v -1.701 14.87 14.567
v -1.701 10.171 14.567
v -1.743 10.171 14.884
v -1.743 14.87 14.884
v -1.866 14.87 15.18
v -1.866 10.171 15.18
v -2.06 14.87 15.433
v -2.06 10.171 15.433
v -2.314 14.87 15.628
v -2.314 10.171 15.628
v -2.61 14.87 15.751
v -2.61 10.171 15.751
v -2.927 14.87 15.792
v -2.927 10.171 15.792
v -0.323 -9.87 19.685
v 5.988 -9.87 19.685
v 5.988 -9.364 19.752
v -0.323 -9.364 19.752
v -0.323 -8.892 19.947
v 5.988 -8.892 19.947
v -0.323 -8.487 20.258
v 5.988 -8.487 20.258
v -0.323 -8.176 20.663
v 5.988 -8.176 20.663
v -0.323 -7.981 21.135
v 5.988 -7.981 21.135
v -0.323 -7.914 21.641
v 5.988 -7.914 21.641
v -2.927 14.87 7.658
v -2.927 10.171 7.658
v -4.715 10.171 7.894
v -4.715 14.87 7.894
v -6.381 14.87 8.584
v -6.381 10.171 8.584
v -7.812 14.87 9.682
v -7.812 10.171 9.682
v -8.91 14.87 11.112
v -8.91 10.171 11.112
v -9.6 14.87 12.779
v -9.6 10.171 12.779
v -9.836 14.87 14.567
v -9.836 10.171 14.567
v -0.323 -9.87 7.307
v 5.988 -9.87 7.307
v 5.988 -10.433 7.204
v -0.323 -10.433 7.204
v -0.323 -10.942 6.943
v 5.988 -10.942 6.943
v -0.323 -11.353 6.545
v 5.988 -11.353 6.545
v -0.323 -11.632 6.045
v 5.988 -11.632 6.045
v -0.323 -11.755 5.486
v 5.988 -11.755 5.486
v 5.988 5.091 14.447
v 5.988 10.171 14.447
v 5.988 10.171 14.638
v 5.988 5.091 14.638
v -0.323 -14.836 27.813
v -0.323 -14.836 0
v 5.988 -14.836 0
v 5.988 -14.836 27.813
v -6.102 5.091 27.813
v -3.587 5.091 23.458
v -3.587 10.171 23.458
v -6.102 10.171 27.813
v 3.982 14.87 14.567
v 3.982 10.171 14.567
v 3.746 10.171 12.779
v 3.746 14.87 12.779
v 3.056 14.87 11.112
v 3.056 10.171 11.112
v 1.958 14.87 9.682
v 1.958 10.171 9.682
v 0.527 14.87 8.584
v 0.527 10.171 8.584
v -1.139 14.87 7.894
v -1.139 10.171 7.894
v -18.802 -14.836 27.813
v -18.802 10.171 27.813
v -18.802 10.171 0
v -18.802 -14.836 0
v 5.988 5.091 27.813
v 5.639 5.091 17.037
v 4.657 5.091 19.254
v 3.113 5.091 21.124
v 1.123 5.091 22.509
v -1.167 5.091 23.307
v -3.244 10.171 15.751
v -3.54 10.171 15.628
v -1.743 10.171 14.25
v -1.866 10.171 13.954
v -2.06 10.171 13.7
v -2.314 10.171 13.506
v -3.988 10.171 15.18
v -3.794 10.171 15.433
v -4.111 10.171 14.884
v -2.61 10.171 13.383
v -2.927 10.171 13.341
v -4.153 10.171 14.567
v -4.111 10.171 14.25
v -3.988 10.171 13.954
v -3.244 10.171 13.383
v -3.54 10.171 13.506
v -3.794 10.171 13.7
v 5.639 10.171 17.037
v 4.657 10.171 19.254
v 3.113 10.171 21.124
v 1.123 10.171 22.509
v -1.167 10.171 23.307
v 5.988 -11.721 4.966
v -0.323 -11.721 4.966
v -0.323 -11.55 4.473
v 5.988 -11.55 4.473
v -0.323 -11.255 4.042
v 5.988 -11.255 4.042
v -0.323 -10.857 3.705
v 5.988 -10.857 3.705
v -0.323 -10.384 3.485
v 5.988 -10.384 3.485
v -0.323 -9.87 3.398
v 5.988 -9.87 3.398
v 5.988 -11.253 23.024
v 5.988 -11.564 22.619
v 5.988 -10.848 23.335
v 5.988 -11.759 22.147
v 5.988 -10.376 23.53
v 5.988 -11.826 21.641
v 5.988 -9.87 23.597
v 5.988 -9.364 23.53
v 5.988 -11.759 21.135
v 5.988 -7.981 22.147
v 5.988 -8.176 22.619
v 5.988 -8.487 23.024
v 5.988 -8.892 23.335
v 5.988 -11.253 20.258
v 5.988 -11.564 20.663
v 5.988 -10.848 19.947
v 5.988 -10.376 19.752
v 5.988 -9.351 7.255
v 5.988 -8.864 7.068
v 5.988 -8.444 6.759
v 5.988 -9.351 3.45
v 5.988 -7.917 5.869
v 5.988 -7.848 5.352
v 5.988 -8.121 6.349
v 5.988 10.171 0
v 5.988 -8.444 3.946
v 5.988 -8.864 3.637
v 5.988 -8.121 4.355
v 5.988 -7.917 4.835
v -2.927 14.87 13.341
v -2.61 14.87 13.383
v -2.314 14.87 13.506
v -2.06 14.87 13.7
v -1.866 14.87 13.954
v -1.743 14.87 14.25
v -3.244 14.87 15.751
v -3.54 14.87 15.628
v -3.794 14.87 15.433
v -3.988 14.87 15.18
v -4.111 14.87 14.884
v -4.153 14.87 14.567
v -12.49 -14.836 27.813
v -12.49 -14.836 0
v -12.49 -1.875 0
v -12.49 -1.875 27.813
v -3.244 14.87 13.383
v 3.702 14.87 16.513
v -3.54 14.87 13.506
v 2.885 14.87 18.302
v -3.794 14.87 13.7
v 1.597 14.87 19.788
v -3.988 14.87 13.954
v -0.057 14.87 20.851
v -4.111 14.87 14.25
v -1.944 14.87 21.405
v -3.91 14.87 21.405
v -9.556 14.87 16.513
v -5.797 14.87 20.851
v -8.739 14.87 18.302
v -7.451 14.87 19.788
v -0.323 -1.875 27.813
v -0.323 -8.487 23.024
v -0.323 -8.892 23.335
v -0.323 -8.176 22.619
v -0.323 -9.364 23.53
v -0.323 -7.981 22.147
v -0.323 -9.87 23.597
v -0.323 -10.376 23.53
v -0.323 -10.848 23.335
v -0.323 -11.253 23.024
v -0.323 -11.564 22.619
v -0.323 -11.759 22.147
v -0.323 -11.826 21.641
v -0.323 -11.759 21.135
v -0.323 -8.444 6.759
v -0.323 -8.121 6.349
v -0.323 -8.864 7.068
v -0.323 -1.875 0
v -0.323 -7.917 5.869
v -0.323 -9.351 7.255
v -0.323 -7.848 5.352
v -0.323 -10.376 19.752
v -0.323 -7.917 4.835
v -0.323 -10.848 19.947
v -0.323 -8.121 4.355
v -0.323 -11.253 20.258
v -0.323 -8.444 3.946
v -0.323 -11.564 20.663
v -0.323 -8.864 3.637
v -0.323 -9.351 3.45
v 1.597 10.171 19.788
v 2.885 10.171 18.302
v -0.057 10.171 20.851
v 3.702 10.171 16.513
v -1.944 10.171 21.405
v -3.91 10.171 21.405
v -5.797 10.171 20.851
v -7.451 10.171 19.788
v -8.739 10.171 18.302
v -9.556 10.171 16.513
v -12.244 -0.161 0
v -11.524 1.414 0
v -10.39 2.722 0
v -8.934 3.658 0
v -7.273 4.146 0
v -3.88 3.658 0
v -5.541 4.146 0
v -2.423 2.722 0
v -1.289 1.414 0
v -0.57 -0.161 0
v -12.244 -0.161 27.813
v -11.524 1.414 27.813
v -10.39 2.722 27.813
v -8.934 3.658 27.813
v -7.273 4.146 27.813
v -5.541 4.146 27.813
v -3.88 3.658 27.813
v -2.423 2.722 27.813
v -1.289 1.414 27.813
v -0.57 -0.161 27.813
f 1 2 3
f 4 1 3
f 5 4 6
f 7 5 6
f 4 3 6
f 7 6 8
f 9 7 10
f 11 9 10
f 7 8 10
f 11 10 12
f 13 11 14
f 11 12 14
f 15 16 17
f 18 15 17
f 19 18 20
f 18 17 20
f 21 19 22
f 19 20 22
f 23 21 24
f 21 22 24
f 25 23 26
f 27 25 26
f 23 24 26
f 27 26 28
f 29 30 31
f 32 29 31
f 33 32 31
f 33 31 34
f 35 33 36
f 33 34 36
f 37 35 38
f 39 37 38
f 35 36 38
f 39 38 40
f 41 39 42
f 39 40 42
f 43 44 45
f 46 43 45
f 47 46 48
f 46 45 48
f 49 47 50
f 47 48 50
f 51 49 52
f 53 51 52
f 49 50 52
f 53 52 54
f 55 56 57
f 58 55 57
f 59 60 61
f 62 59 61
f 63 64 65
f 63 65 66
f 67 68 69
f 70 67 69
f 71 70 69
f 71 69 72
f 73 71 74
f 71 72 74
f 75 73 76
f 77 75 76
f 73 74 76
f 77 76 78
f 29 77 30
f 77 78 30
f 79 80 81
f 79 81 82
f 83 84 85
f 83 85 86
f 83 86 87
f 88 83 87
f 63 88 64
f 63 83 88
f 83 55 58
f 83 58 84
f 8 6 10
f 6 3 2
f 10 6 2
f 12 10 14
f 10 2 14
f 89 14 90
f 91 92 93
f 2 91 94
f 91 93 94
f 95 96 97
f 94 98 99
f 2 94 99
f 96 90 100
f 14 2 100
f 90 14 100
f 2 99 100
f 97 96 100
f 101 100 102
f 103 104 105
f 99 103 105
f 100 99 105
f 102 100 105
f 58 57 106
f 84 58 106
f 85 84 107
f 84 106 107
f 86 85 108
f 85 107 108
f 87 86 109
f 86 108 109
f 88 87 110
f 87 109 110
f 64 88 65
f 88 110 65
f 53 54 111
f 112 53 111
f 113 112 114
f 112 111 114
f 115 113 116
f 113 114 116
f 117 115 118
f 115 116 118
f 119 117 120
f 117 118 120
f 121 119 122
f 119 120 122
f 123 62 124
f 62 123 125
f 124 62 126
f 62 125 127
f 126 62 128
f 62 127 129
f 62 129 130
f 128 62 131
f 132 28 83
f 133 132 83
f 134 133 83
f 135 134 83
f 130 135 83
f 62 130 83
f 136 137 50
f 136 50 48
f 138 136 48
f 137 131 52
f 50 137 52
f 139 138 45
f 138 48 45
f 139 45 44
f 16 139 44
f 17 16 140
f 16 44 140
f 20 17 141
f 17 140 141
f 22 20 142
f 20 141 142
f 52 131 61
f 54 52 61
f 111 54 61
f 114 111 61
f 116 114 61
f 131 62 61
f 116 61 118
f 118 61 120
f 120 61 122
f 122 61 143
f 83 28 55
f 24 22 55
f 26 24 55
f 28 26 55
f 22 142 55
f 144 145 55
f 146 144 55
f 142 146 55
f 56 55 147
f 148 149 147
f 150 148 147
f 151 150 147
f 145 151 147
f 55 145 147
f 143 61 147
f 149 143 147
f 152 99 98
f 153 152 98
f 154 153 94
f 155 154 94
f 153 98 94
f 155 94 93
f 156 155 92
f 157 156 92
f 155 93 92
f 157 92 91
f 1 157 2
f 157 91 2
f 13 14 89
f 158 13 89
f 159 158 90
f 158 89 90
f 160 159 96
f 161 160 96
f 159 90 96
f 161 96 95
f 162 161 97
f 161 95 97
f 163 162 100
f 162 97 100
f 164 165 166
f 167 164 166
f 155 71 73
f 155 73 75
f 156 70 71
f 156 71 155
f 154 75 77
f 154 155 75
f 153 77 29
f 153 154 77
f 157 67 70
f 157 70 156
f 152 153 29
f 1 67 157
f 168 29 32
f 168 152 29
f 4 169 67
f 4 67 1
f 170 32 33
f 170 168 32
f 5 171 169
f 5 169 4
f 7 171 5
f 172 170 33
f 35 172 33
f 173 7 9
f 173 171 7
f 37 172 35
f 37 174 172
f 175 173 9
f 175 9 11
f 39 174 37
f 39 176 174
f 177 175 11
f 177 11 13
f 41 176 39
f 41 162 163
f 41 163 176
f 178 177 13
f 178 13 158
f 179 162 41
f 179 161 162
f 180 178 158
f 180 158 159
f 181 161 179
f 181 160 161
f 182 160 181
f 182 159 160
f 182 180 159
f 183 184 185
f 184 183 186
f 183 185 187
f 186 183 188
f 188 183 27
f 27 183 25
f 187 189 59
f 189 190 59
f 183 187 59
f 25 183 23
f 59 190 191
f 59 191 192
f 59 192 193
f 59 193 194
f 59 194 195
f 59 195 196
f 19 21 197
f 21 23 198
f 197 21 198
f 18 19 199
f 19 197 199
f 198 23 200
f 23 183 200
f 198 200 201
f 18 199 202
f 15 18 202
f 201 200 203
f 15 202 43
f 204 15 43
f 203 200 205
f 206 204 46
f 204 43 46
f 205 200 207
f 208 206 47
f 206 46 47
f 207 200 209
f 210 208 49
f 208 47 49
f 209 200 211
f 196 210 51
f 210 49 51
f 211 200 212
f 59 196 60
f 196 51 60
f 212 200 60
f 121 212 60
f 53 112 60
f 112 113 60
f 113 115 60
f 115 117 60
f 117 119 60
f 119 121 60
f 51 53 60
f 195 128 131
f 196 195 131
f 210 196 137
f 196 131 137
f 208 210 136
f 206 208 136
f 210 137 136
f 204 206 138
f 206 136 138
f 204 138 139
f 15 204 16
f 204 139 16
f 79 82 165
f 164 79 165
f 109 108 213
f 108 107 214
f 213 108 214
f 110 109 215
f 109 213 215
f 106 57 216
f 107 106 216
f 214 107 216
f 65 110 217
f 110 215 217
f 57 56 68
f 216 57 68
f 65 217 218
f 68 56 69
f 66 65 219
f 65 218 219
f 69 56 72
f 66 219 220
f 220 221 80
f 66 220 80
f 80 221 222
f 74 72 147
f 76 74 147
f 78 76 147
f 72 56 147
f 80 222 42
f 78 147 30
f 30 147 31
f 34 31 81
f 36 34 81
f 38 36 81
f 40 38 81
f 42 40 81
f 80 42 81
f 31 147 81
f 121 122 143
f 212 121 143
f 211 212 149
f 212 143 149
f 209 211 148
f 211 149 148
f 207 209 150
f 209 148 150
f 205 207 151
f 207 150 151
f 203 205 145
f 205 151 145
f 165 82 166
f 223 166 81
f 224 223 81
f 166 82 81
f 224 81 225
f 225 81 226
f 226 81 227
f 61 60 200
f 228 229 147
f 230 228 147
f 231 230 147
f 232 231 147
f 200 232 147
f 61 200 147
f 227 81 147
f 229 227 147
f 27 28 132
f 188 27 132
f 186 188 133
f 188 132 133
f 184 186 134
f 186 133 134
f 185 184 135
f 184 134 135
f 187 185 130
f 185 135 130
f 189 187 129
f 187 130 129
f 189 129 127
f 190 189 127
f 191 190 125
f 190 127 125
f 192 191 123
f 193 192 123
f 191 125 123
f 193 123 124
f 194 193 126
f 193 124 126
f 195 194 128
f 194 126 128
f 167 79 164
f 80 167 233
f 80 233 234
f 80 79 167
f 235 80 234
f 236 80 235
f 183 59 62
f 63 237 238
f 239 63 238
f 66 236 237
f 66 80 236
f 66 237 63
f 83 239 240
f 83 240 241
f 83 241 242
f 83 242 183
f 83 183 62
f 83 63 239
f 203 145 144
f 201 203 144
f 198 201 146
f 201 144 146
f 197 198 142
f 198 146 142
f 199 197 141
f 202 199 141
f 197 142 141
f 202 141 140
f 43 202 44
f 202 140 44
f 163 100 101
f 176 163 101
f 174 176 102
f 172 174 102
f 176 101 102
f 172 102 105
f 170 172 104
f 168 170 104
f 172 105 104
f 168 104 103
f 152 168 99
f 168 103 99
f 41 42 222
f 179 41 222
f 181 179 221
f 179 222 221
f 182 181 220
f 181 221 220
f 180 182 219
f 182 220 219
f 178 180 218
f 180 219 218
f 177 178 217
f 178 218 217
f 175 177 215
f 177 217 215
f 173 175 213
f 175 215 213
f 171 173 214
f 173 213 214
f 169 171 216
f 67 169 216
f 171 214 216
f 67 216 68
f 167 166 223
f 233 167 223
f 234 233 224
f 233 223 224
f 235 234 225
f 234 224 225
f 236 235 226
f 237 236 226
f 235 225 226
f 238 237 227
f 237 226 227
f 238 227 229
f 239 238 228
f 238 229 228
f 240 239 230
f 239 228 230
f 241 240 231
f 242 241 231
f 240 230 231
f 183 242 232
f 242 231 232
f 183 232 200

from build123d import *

# Parameters (mm, degrees)
F1_DEPTH = 27.813
F3_DEPTH = 6.3119
F5_DEPTH = 4.699
F7_DEPTH = 5.08


with BuildPart() as f1:
    # F0 (on Top) → F1 (new body)
    with BuildSketch(Plane.XY):
        with BuildLine():
            Line((-18.8019596104, 10.1706712406), (-18.8019596104, -14.8356287594))
            Line((-18.8019596104, -14.8356287594), (-12.4900596104, -14.8356287594))
            Line((-12.4900596104, -14.8356287594), (-12.4900596104, -1.8752787594))
            ThreePointArc((-12.4900596104, -1.8752787594), (-6.4067596104, 4.2080212406), (-0.3234596104, -1.8752787594))
            Line((-0.3234596104, -1.8752787594), (-0.3234596104, -14.8356287594))
            Line((-0.3234596104, -14.8356287594), (5.9884403896, -14.8356287594))
            Line((5.9884403896, -14.8356287594), (5.9884403896, 10.1706712406))
            Line((5.9884403896, 10.1706712406), (-18.8019596104, 10.1706712406))
        make_face()
    extrude(amount=F1_DEPTH)

    # F2 (on face) → F3 (cut, through all)
    with BuildSketch(Plane.YZ.offset(5.9884403896)):
        with BuildLine():
            ThreePointArc((-7.9141287594, 21.6408), (-8.4869693167, 23.0237594426), (-9.8699287594, 23.5966))
            Line((-9.8699287594, 23.5966), (-9.8699287594, 21.6408))
            Line((-9.8699287594, 21.6408), (-9.8699287594, 19.685))
            ThreePointArc((-9.8699287594, 19.685), (-8.4869693167, 20.2578405574), (-7.9141287594, 21.6408))
        make_face()
        with BuildLine():
            Line((-9.8699287594, 21.6408), (-9.8699287594, 23.5966))
            ThreePointArc((-9.8699287594, 23.5966), (-11.252888202, 23.0237594426), (-11.8257287594, 21.6408))
            Line((-11.8257287594, 21.6408), (-9.8699287594, 21.6408))
        make_face()
        with BuildLine():
            Line((-9.8699287594, 19.685), (-9.8699287594, 21.6408))
            Line((-9.8699287594, 21.6408), (-11.8257287594, 21.6408))
            ThreePointArc((-11.8257287594, 21.6408), (-11.252888202, 20.2578405574), (-9.8699287594, 19.685))
        make_face()
        with BuildLine():
            ThreePointArc((-7.8475873364, 5.3523653187), (-8.4441574212, 6.7586539368), (-9.8699287594, 7.3070330344))
            Line((-9.8699287594, 7.3070330344), (-9.8699287594, 5.4864))
            Line((-9.8699287594, 5.4864), (-9.8699287594, 3.3976976029))
            ThreePointArc((-9.8699287594, 3.3976976029), (-8.4441574212, 3.9460767006), (-7.8475873364, 5.3523653187))
        make_face()
        with BuildLine():
            Line((-9.8699287594, 5.4864), (-9.8699287594, 7.3070330344))
            ThreePointArc((-9.8699287594, 7.3070330344), (-11.1622464384, 6.7590122471), (-11.7545891057, 5.4864))
            Line((-11.7545891057, 5.4864), (-9.8699287594, 5.4864))
        make_face()
        with BuildLine():
            ThreePointArc((-11.7545891057, 5.4864), (-11.2554518403, 4.0421507116), (-9.8699287594, 3.3976976029))
            Line((-9.8699287594, 3.3976976029), (-9.8699287594, 5.4864))
            Line((-9.8699287594, 5.4864), (-11.7545891057, 5.4864))
        make_face()
    extrude(amount=-F3_DEPTH, mode=Mode.SUBTRACT)

    # F4 (on face) → F5 (join)
    with BuildSketch(Plane(origin=(0, 10.1706712406, 0), x_dir=(-1, 0, 0), z_dir=(0, 1, 0))):
        with BuildLine():
            ThreePointArc((-3.9818403896, 14.5669), (-1.9582997195, 9.6816406701), (2.9269596104, 7.6581))
            Line((2.9269596104, 7.6581), (2.9269596104, 13.34135))
            ThreePointArc((2.9269596104, 13.34135), (2.0603648947, 13.7003052843), (1.7014096104, 14.5669))
            Line((1.7014096104, 14.5669), (-3.9818403896, 14.5669))
        make_face()
        with BuildLine():
            Line((2.9269596104, 13.34135), (2.9269596104, 7.6581))
            ThreePointArc((2.9269596104, 7.6581), (7.8122189403, 9.6816406701), (9.8357596104, 14.5669))
            ThreePointArc((9.8357596104, 14.5669), (2.9269596104, 21.4757), (-3.9818403896, 14.5669))
            Line((-3.9818403896, 14.5669), (1.7014096104, 14.5669))
            ThreePointArc((1.7014096104, 14.5669), (2.0603648947, 15.4334947157), (2.9269596104, 15.79245))
            ThreePointArc((2.9269596104, 15.79245), (3.7935543261, 15.4334947157), (4.1525096104, 14.5669))
            ThreePointArc((4.1525096104, 14.5669), (3.7935543261, 13.7003052843), (2.9269596104, 13.34135))
        make_face()
    extrude(amount=F5_DEPTH)

    # F6 (on face) → F7 (cut)
    with BuildSketch(Plane(origin=(0, 10.1706712406, 0), x_dir=(-1, 0, 0), z_dir=(0, 1, 0))):
        with BuildLine():
            Line((3.5874825428, 23.4577979645), (6.1019596104, 27.813))
            Line((6.1019596104, 27.813), (-5.9884403896, 27.813))
            Line((-5.9884403896, 27.813), (-5.9884403896, 14.4474878907))
            Line((-5.9884403896, 14.4474878907), (-5.9881597655, 14.637636653))
            ThreePointArc((-5.9881597655, 14.637636653), (-3.11318956, 21.1244113541), (3.5874825428, 23.4577979645))
        make_face()
    extrude(amount=-F7_DEPTH, mode=Mode.SUBTRACT)


solid = f1.part
